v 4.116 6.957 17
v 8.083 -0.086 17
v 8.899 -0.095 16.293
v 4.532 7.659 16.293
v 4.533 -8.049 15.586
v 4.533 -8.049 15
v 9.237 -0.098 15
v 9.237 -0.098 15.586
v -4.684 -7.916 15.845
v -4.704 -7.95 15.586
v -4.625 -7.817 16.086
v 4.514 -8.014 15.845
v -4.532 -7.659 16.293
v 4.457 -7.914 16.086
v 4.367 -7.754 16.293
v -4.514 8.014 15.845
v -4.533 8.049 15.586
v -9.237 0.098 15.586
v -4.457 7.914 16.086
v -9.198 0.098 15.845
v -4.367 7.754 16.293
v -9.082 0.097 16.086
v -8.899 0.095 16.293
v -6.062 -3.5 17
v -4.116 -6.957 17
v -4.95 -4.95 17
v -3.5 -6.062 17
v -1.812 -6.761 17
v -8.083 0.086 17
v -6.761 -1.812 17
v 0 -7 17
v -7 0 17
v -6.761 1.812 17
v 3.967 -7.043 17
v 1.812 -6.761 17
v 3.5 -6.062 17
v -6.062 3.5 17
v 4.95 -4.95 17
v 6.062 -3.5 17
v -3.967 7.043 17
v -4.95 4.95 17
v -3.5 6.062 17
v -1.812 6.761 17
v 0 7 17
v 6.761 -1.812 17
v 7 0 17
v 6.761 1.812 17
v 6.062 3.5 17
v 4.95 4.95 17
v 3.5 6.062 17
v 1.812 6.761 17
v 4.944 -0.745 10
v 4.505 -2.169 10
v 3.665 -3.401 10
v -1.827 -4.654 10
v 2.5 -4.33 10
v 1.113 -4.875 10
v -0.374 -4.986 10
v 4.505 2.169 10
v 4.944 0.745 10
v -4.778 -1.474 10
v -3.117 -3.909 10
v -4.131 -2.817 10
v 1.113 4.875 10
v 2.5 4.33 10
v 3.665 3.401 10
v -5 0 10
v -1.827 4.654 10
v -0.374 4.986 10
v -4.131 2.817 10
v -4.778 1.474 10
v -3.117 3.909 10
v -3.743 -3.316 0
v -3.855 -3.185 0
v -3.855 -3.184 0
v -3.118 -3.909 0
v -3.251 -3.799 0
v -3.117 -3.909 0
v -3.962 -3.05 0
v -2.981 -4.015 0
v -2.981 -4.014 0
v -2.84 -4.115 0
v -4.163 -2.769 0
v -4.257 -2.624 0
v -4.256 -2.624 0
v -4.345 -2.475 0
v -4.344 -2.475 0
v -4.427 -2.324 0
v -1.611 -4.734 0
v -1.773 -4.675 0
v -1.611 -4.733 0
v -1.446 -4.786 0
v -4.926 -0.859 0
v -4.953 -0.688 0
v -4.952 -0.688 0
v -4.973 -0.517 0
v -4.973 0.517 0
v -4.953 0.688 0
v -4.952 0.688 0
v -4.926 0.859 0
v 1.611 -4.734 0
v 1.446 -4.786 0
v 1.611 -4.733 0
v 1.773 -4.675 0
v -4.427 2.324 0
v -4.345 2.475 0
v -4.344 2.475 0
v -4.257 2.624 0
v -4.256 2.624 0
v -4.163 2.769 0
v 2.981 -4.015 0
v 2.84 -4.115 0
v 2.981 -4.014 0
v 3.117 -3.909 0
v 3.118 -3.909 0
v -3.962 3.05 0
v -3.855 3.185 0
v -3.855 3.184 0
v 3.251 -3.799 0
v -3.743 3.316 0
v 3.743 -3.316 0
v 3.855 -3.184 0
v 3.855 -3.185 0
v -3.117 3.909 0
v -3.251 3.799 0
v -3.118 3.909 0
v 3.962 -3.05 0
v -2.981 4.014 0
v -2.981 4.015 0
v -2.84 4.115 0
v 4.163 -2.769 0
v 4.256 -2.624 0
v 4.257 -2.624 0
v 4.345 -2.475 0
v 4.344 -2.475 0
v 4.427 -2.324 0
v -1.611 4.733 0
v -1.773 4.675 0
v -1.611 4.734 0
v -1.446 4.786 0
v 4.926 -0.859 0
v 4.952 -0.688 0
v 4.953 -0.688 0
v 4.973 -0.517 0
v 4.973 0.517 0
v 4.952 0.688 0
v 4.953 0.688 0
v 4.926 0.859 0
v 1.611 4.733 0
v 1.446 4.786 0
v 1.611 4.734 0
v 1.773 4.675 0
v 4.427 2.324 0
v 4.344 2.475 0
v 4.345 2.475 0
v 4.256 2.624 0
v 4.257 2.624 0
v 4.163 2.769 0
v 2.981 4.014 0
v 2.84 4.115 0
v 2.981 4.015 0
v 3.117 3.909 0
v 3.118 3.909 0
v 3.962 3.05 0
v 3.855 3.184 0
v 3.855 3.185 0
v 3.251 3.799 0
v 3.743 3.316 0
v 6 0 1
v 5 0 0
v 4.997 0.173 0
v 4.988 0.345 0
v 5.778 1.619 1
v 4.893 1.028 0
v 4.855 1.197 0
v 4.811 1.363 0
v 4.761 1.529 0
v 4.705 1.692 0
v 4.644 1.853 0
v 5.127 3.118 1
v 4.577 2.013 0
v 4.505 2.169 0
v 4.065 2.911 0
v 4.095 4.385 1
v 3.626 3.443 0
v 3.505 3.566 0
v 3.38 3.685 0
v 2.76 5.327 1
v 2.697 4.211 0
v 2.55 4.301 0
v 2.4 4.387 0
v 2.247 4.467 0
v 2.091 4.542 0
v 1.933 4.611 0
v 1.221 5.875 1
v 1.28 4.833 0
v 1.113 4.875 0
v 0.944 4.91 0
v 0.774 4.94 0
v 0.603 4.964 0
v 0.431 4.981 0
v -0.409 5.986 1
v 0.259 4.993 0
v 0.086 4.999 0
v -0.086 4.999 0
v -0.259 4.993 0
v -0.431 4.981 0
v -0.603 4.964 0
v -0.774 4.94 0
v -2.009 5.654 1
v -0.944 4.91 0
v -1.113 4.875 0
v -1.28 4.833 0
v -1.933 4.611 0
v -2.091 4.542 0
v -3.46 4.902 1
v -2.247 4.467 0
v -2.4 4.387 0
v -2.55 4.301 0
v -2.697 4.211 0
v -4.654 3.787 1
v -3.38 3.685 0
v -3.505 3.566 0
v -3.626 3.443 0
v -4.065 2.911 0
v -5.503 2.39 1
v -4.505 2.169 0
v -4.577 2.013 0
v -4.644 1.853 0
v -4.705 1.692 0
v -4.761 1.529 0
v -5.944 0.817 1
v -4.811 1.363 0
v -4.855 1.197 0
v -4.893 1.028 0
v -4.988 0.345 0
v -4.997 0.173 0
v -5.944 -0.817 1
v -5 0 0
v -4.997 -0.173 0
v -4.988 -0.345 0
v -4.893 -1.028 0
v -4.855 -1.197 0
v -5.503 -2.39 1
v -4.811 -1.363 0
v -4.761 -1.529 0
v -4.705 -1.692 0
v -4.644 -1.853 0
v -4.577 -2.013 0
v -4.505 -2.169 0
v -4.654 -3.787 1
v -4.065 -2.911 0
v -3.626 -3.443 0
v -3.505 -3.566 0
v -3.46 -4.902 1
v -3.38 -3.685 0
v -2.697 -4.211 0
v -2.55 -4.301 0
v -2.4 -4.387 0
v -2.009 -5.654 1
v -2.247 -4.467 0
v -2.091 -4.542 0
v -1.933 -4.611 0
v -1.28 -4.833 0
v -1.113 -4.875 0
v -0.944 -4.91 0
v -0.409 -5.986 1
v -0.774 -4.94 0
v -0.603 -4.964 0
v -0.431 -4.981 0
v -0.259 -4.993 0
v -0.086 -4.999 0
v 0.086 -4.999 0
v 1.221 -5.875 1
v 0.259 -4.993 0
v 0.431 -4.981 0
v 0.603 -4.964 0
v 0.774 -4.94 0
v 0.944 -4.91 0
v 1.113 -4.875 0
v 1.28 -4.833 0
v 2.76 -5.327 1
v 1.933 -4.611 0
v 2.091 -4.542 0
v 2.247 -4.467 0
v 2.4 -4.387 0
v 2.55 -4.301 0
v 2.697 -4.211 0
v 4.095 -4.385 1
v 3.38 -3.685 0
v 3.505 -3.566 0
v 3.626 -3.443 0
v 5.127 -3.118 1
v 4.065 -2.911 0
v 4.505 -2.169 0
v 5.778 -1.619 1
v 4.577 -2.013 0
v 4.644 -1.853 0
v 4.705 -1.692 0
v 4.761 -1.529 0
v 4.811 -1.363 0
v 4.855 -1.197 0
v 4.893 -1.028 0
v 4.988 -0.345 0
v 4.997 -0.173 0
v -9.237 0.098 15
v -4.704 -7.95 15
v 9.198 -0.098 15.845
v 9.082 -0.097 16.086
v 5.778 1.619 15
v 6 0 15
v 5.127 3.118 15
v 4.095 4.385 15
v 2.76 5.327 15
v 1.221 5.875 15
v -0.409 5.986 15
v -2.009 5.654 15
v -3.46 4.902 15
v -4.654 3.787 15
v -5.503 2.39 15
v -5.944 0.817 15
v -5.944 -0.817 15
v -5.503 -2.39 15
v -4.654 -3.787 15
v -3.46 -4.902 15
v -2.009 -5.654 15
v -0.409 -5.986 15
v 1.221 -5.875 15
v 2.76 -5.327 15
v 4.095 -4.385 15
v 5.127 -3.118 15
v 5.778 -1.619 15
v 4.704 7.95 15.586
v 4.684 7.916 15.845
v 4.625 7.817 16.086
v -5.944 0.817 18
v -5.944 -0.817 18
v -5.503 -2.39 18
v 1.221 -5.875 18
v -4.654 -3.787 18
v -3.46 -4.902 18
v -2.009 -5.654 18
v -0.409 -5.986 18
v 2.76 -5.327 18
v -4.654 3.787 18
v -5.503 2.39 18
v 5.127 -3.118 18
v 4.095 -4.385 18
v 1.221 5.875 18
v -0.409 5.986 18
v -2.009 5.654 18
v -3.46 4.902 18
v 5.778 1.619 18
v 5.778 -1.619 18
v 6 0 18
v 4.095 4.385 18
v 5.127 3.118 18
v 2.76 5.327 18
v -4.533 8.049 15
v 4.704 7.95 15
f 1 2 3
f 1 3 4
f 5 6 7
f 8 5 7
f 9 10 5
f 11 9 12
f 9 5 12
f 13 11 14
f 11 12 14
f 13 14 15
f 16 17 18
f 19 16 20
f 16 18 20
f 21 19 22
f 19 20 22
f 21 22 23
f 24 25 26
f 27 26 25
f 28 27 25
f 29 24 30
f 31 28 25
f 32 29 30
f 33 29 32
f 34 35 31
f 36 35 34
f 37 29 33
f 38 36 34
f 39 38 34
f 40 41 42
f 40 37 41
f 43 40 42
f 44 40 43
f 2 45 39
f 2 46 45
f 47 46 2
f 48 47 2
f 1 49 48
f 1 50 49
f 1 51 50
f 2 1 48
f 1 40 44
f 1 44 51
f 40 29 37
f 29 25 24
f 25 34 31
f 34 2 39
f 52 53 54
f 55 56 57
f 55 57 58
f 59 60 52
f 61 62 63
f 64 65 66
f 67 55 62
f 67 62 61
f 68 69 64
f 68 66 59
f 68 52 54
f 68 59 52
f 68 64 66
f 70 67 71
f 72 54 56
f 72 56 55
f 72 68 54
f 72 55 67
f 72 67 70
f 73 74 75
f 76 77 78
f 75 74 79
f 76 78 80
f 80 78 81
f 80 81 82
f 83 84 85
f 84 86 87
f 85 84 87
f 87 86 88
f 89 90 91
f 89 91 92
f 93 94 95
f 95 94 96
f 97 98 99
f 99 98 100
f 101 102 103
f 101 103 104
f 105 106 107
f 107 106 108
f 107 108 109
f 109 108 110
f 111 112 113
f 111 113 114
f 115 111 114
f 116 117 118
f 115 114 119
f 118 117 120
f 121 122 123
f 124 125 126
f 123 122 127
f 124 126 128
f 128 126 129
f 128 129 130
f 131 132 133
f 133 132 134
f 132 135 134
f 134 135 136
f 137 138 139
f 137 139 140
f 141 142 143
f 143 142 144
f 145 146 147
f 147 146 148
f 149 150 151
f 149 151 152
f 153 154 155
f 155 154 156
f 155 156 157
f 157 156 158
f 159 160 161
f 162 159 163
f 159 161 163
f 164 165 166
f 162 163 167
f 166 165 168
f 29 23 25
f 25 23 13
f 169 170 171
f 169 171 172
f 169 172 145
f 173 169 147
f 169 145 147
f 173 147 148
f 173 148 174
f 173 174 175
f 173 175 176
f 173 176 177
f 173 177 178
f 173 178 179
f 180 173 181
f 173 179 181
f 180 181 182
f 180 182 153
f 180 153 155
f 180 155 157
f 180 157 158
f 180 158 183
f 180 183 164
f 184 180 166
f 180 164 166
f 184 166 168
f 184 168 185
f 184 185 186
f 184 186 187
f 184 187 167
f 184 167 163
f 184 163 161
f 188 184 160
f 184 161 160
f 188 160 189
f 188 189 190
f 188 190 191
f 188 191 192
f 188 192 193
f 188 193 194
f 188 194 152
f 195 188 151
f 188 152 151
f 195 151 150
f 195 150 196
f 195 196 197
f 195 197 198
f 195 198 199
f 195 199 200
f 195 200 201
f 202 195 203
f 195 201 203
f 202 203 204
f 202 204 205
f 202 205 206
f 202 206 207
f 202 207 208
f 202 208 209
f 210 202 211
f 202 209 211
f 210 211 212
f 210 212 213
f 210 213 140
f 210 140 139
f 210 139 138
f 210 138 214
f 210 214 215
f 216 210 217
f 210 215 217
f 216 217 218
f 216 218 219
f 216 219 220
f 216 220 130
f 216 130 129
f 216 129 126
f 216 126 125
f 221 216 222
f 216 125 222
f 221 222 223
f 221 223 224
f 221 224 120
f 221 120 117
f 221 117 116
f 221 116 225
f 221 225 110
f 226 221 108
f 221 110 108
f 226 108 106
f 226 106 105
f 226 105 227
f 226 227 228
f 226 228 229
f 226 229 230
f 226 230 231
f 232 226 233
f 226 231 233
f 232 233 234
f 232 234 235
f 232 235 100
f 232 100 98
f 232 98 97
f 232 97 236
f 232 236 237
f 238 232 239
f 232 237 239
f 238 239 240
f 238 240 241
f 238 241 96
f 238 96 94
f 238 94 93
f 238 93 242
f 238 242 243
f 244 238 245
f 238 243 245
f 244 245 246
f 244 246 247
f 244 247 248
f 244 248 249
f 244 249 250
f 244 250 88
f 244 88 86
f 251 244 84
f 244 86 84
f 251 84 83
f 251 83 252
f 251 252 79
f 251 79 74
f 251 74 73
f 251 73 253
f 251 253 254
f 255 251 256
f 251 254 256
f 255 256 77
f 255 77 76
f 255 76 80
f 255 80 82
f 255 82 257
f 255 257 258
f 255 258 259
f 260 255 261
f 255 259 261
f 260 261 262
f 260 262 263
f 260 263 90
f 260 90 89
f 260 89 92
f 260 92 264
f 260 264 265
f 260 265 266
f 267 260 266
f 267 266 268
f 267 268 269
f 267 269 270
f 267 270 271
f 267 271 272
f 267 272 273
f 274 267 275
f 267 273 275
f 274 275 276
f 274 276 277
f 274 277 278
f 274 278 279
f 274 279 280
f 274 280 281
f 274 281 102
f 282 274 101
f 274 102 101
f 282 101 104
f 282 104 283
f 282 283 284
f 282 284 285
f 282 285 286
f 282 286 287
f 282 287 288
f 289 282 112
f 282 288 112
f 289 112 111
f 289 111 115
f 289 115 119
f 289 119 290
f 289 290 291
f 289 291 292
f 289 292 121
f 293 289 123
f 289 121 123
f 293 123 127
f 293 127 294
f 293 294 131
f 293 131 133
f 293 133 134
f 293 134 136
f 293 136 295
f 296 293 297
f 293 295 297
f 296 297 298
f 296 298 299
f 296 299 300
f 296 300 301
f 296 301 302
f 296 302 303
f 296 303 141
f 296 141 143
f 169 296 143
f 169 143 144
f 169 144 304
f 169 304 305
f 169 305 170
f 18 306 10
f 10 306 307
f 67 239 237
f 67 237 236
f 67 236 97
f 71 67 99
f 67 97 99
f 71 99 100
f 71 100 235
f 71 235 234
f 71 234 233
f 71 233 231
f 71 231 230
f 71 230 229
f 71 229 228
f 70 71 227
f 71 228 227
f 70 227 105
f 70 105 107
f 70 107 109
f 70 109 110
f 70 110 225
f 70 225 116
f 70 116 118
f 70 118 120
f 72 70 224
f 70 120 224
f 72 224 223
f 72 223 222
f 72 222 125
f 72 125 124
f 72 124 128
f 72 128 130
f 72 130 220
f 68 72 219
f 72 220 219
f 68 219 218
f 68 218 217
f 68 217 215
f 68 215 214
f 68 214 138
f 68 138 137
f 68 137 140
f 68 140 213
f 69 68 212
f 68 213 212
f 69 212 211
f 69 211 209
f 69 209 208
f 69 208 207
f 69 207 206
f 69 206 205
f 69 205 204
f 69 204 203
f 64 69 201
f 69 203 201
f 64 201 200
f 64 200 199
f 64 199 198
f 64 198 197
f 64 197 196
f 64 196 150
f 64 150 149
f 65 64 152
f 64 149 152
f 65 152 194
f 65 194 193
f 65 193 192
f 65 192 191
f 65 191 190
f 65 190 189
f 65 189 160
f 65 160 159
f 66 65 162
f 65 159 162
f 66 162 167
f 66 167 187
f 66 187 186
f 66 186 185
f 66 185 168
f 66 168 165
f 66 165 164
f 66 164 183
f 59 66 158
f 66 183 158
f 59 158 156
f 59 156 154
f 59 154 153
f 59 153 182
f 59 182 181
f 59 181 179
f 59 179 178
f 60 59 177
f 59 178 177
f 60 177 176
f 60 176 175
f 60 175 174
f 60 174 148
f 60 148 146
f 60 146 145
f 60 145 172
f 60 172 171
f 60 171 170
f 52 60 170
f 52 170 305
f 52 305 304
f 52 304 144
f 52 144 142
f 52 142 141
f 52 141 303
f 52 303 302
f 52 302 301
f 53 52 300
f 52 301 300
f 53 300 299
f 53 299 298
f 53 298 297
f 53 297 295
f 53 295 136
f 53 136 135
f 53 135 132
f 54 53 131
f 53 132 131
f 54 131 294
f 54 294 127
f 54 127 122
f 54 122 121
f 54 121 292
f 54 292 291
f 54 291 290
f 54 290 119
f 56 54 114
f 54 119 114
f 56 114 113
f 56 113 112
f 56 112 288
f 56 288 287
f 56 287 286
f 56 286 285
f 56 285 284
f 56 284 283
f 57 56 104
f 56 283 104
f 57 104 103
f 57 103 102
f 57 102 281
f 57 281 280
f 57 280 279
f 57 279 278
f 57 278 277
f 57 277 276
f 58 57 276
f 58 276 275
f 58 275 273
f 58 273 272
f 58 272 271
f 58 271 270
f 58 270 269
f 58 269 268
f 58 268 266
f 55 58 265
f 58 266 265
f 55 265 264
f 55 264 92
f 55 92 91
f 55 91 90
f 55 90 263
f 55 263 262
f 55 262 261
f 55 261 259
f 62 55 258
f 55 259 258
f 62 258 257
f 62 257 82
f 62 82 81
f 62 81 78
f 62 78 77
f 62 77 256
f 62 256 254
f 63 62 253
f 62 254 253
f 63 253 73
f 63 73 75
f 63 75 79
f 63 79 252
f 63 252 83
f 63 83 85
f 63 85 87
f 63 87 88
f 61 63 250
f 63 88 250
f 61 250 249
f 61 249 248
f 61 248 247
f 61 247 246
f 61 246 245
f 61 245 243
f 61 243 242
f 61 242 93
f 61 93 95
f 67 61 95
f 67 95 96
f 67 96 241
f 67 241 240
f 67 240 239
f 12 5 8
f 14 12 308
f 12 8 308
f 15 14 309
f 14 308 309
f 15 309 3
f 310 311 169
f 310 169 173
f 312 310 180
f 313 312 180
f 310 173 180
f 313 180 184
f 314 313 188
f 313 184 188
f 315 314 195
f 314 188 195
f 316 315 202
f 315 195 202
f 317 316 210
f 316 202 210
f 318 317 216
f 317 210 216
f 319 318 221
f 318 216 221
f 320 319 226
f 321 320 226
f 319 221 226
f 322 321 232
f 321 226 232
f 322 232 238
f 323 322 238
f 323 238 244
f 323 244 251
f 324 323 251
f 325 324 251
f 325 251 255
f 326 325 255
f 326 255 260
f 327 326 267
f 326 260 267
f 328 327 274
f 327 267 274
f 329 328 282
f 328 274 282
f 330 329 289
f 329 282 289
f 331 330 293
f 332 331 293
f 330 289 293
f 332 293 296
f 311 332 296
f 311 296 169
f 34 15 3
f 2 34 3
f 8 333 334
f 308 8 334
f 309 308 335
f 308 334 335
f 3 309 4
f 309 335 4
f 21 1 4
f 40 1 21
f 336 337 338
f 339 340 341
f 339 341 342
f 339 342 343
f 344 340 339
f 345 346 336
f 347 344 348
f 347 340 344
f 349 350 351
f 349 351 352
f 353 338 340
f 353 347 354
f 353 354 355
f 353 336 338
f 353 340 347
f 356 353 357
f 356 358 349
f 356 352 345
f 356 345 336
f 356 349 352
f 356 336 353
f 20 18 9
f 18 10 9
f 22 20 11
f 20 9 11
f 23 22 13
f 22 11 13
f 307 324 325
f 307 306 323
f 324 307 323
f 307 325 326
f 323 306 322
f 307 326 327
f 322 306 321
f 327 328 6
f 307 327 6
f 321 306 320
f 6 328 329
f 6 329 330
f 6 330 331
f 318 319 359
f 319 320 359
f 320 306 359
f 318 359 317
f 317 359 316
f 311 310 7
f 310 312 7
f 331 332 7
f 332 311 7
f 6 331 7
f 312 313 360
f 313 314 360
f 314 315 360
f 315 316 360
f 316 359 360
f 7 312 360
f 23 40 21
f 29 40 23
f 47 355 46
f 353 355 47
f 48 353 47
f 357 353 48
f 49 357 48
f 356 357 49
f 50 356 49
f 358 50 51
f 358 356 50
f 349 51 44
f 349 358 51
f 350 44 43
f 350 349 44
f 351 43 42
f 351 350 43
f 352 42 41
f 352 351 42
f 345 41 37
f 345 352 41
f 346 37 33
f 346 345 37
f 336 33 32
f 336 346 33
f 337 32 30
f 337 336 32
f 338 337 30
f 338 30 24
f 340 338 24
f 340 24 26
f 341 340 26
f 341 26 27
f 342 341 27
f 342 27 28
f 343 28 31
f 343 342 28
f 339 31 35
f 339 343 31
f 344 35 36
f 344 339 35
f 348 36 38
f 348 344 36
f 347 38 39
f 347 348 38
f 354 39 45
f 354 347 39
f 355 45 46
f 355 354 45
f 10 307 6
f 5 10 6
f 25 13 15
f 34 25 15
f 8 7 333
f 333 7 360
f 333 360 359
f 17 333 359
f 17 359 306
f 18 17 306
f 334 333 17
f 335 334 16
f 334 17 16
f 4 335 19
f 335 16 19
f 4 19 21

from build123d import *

# Parameters (mm, degrees)
SKETCH_1_R          = 6
EXTRUDE_1_DEPTH     = 15
EXTRUDE_2_DEPTH     = 2
SKETCH_3_R          = 7
EXTRUDE_3_DEPTH     = 1
CHAMFER_1_SIZE      = 1
FILLET_1_R          = 1
SKETCH_4_R          = 5
CUT_EXTRUDE_1_DEPTH = 10


with BuildPart() as part:
    # 草图1 → 凸台-拉伸1 (new body)
    with BuildSketch(Plane.XY):
        Circle(SKETCH_1_R)
    extrude(amount=EXTRUDE_1_DEPTH)

    # 草图2 → 凸台-拉伸2 (add)
    with BuildSketch(Plane.XY.offset(15)):
        Polygon((4.70381444, 7.950312136), (-4.533265058, 8.048778867), (-9.237079497, 0.098466732), (-4.70381444, -7.950312136), (4.533265058, -8.048778867), (9.237079497, -0.098466732), align=None)
    extrude(amount=EXTRUDE_2_DEPTH)

    # 草图3 → 凸台-拉伸3 (add)
    with BuildSketch(Plane.XY.offset(17)):
        Circle(SKETCH_3_R)
    extrude(amount=EXTRUDE_3_DEPTH)

    # 倒角1
    chamfer_1_edges = [part.edges().sort_by_distance(p)[0] for p in [
        (-6, 0, 0),
        (-7, 0, 18),
        (6.970446968, 3.925922702, 17),
        (0.085274691, 7.999545501, 17),
        (-6.885172277, 4.073622799, 17),
        (-6.970446968, -3.925922702, 17),
        (-0.085274691, -7.999545501, 17),
        (6.885172277, -4.073622799, 17),
    ]]
    chamfer(chamfer_1_edges, length=CHAMFER_1_SIZE - 0.0001)  # a hair under: the kernel refuses the full size

    # 圆角1
    fillet_1_edges = [part.edges().sort_by_distance(p)[0] for p in [
        (-6.885172277, 4.073622799, 16.0001),
        (0.085274691, 7.999545501, 16.0001),
        (6.970446968, 3.925922702, 16.0001),
        (6.885172277, -4.073622799, 16.0001),
        (-6.970446968, -3.925922702, 16.0001),
        (-0.085274691, -7.999545501, 16.0001),
    ]]
    fillet(fillet_1_edges, radius=FILLET_1_R)

    # 草图4 → 切除-拉伸1 (cut)
    with BuildSketch(Plane(origin=(0, 0, 0), x_dir=(-1, 0, 0), z_dir=(0, 0, -1))):
        Circle(SKETCH_4_R)
    extrude(amount=-CUT_EXTRUDE_1_DEPTH, mode=Mode.SUBTRACT)


solid = part.part
